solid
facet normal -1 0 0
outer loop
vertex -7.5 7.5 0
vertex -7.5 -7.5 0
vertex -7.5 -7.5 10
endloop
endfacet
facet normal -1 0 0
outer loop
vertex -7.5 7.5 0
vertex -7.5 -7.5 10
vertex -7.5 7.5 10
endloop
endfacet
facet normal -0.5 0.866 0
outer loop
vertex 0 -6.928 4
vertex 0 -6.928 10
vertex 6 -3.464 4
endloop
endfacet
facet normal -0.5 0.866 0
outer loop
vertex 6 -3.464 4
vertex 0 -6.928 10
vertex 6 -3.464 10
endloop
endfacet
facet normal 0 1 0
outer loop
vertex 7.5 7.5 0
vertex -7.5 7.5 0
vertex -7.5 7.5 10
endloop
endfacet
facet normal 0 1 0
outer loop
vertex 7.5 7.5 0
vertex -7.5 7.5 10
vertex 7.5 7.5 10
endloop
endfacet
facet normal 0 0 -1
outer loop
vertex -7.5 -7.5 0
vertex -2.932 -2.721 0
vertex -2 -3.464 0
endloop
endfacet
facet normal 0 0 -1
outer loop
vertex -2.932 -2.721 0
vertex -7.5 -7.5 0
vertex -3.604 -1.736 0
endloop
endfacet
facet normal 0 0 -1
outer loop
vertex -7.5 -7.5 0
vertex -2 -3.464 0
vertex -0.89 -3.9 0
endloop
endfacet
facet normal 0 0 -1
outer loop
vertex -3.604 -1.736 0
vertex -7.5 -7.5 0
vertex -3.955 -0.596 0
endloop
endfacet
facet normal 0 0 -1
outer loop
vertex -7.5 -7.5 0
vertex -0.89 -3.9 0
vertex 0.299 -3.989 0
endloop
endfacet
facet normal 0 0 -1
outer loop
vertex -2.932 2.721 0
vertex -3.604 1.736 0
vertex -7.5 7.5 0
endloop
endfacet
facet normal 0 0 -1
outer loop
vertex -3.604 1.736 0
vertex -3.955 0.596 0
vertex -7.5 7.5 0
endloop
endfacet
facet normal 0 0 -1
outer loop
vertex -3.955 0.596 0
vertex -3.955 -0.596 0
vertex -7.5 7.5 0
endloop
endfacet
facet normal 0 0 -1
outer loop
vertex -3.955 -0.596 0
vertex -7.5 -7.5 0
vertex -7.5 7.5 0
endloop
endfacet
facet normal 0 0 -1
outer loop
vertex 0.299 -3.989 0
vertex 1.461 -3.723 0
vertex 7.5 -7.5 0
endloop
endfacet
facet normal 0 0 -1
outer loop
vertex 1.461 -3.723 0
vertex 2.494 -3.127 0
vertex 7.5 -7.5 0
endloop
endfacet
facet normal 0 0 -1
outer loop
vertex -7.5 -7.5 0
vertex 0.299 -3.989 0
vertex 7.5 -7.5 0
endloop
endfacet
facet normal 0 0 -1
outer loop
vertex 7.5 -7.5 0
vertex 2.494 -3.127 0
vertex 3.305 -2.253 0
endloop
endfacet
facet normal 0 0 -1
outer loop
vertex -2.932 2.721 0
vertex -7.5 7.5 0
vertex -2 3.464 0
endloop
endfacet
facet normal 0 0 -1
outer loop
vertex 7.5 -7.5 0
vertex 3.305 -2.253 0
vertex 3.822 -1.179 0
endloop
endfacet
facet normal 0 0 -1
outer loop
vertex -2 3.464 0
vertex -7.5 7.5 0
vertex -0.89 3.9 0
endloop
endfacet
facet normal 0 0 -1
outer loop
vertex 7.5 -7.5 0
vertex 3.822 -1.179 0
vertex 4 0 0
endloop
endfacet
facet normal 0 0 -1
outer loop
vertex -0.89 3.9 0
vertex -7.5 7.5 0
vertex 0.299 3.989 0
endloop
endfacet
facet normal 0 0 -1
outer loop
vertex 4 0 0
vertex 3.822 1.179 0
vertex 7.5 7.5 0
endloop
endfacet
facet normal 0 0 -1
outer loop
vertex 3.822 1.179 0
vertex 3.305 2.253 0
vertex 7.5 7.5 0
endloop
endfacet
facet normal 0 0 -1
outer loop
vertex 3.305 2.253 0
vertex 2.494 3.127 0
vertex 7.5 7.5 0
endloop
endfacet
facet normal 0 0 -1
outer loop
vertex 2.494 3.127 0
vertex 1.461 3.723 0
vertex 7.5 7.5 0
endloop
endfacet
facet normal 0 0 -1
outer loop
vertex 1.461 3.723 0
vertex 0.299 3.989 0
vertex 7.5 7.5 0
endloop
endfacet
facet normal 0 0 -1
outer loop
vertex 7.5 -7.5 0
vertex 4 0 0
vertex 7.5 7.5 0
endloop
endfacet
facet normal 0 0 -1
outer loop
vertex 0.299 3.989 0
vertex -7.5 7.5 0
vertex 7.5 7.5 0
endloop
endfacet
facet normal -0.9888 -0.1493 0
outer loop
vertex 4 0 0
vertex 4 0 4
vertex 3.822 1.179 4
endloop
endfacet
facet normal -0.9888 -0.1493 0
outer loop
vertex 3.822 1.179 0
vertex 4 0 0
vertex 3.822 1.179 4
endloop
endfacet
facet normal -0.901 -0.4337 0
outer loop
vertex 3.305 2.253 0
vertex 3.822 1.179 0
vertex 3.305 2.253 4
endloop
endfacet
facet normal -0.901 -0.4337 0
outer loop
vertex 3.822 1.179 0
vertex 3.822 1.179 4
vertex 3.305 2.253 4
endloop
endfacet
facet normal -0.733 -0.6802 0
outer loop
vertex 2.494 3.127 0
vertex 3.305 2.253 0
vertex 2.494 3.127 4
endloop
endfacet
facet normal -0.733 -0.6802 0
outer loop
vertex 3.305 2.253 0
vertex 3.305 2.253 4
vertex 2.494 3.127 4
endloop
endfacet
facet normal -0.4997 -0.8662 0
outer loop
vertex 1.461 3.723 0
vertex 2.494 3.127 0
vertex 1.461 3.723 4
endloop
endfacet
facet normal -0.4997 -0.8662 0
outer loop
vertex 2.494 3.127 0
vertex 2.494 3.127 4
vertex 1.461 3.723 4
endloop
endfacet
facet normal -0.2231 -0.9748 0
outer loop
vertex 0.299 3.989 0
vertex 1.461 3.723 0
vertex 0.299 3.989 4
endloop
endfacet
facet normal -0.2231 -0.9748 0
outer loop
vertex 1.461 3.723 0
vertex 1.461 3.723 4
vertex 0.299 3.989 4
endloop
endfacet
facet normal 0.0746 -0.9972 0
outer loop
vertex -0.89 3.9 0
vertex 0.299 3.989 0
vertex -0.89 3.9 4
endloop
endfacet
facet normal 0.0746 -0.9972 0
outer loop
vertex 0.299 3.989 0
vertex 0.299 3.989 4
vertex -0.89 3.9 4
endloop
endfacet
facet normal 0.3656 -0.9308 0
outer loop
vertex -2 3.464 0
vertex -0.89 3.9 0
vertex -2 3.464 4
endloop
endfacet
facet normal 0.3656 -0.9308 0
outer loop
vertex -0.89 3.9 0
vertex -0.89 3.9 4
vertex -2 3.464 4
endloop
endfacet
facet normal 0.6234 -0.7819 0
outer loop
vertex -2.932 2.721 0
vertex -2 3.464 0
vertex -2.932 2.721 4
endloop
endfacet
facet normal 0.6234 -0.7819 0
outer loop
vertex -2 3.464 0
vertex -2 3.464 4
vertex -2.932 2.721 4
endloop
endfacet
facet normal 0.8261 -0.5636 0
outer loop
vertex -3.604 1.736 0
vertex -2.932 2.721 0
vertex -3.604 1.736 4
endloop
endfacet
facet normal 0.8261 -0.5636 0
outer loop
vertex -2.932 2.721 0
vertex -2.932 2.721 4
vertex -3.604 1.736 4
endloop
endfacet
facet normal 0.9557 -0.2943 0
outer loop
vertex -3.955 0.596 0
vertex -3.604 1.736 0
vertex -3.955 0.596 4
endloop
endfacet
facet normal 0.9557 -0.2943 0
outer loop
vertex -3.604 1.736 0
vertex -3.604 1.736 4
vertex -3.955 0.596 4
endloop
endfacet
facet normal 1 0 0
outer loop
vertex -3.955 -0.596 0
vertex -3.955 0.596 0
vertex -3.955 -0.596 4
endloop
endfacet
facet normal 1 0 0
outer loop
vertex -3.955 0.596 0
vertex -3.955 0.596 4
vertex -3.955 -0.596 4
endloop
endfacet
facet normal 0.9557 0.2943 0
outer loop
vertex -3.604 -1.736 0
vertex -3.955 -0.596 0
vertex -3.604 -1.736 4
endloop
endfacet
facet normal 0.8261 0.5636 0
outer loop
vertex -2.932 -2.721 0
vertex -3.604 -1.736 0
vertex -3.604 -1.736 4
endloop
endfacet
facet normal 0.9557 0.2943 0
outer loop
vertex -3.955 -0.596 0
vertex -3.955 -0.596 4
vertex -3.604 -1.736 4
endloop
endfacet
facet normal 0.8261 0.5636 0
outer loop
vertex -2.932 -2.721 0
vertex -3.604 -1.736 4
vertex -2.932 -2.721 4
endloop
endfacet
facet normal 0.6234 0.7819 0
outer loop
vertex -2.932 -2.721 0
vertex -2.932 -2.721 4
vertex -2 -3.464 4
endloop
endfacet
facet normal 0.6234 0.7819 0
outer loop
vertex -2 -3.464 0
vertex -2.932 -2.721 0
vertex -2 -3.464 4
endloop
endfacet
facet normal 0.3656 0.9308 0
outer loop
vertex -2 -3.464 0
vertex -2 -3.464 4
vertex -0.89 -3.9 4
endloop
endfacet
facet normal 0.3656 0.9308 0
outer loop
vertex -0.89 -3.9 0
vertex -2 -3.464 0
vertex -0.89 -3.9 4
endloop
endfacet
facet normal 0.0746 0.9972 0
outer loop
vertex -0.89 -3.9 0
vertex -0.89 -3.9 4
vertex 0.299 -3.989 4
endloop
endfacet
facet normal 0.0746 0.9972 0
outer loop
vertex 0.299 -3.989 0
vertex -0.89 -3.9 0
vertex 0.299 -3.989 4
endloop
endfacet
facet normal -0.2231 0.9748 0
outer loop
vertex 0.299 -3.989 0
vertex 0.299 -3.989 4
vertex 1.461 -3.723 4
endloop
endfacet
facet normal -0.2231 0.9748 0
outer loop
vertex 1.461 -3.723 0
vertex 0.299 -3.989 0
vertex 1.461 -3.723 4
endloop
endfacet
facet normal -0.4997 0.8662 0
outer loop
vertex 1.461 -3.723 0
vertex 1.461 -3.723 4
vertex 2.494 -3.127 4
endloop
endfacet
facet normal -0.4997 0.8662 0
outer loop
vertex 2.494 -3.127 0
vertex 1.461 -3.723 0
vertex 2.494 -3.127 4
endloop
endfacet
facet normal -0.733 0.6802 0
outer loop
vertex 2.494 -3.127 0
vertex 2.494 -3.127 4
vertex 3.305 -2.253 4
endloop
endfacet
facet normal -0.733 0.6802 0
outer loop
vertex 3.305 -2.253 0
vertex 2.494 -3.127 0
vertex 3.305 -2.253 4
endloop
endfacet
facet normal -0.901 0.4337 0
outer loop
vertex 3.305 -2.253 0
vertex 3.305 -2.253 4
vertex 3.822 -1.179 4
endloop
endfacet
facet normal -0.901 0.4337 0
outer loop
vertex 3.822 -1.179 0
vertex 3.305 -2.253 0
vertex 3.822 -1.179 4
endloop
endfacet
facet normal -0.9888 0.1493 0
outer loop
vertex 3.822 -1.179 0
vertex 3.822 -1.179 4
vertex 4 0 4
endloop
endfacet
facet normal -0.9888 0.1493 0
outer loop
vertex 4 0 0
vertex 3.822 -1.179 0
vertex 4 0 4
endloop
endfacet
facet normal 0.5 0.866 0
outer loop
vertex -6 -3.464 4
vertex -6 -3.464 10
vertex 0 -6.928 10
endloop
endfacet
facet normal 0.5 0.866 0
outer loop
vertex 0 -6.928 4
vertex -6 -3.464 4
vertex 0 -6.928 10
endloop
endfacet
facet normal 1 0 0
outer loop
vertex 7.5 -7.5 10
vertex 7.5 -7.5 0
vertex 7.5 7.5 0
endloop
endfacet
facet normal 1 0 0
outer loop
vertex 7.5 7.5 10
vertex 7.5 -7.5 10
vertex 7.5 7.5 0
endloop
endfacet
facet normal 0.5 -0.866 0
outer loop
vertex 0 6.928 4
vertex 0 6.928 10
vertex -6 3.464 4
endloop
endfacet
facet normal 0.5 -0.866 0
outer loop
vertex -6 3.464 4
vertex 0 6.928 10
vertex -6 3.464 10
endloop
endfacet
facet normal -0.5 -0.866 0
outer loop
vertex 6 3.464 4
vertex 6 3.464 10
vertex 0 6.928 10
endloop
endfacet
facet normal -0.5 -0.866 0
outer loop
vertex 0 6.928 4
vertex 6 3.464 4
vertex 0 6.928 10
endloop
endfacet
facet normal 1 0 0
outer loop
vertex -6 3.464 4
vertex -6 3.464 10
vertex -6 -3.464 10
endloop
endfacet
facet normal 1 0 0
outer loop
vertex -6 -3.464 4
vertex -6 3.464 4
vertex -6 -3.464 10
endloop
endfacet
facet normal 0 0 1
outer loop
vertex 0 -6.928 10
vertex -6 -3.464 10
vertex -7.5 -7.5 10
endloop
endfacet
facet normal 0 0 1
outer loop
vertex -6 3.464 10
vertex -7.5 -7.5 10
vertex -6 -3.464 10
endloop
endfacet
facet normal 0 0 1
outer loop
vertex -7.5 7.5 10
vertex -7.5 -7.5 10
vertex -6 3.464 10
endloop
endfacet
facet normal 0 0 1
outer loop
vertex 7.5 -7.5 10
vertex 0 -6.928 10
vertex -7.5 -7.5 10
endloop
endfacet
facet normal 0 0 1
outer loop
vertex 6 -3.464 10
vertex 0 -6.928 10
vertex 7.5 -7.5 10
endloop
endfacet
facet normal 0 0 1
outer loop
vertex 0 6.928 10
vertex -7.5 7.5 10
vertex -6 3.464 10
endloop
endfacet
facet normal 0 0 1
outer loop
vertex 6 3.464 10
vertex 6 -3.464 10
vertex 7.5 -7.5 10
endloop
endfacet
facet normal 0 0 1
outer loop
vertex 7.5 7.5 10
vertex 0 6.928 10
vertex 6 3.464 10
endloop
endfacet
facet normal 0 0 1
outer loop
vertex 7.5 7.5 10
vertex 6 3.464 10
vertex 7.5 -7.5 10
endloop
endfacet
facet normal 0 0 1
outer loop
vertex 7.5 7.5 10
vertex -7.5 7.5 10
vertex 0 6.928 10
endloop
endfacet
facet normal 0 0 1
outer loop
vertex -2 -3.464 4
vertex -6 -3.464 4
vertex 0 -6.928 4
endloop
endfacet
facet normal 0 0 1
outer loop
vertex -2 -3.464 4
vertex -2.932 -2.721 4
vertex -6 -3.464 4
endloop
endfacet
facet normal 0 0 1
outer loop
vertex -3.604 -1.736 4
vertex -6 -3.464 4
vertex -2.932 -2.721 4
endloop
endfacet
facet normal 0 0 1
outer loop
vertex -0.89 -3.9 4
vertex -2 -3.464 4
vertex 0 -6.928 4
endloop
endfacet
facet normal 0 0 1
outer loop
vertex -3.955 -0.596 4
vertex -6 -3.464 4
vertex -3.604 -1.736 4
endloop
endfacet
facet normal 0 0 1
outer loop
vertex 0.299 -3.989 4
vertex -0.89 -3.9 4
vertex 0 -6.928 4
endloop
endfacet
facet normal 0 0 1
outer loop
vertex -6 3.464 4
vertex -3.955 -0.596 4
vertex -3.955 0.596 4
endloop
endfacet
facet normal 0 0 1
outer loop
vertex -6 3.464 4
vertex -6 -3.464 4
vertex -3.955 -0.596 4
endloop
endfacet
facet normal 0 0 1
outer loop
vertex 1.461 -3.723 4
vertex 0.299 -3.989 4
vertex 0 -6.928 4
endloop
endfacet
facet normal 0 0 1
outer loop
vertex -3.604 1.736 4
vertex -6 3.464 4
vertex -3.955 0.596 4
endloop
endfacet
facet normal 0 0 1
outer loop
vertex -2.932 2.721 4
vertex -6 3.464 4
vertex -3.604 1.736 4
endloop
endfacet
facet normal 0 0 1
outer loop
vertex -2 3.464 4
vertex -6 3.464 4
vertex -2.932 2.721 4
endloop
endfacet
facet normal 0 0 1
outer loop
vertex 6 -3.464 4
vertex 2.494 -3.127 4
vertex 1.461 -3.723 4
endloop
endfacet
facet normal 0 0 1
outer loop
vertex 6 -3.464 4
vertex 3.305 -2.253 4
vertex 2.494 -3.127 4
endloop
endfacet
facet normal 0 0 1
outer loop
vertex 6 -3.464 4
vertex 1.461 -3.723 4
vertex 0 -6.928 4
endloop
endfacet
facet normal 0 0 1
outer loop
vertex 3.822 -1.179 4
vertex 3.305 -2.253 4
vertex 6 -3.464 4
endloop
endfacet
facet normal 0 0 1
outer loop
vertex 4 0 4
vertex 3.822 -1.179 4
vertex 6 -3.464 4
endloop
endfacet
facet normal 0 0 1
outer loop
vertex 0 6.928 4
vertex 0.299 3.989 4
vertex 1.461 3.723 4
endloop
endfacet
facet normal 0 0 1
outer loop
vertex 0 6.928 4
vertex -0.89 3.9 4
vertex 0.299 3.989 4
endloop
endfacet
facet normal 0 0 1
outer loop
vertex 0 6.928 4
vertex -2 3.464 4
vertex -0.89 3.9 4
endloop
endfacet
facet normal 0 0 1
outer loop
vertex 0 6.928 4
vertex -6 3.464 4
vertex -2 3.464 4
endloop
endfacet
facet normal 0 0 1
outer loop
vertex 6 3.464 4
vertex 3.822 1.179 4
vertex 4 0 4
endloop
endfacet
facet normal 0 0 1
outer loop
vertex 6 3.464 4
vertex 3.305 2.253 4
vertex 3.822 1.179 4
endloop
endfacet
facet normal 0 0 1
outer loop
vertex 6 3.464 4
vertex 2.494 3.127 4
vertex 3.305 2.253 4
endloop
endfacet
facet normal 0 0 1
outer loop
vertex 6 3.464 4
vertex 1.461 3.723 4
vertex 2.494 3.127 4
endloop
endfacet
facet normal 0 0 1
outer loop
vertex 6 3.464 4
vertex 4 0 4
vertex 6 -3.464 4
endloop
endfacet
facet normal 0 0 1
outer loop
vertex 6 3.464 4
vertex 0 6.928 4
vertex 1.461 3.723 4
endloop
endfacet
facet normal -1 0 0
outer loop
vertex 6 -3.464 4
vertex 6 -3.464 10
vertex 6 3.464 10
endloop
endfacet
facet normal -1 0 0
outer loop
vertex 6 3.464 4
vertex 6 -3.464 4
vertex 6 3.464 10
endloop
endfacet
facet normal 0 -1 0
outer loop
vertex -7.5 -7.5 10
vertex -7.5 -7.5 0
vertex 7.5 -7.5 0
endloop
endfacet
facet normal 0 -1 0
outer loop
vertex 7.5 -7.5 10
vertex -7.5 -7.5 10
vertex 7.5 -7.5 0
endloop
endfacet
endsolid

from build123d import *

# Parameters (mm, degrees)
F0_W     = 15
F0_H     = 15
F1_DEPTH = 10
F3_DEPTH = 6
F4_R     = 4
F5_DEPTH = 25


with BuildPart() as f1:
    # F0 (on Top) → F1 (new body)
    with BuildSketch(Plane.XY):
        Rectangle(F0_W, F0_H)
    extrude(amount=F1_DEPTH)

    # F2 (on face) → F3 (cut)
    with BuildSketch(Plane.XY.offset(10)):
        Polygon((0, -6.928203), (6, -3.464102), (6, 3.464102), (0, 6.928203), (-6, 3.464102), (-6, -3.464102), align=None)
    extrude(amount=-F3_DEPTH, mode=Mode.SUBTRACT)

    # F4 (on face) → F5 (cut)
    with BuildSketch(Plane.XY.offset(4)):
        Circle(F4_R)
    extrude(amount=-F5_DEPTH, mode=Mode.SUBTRACT)


solid = f1.part
